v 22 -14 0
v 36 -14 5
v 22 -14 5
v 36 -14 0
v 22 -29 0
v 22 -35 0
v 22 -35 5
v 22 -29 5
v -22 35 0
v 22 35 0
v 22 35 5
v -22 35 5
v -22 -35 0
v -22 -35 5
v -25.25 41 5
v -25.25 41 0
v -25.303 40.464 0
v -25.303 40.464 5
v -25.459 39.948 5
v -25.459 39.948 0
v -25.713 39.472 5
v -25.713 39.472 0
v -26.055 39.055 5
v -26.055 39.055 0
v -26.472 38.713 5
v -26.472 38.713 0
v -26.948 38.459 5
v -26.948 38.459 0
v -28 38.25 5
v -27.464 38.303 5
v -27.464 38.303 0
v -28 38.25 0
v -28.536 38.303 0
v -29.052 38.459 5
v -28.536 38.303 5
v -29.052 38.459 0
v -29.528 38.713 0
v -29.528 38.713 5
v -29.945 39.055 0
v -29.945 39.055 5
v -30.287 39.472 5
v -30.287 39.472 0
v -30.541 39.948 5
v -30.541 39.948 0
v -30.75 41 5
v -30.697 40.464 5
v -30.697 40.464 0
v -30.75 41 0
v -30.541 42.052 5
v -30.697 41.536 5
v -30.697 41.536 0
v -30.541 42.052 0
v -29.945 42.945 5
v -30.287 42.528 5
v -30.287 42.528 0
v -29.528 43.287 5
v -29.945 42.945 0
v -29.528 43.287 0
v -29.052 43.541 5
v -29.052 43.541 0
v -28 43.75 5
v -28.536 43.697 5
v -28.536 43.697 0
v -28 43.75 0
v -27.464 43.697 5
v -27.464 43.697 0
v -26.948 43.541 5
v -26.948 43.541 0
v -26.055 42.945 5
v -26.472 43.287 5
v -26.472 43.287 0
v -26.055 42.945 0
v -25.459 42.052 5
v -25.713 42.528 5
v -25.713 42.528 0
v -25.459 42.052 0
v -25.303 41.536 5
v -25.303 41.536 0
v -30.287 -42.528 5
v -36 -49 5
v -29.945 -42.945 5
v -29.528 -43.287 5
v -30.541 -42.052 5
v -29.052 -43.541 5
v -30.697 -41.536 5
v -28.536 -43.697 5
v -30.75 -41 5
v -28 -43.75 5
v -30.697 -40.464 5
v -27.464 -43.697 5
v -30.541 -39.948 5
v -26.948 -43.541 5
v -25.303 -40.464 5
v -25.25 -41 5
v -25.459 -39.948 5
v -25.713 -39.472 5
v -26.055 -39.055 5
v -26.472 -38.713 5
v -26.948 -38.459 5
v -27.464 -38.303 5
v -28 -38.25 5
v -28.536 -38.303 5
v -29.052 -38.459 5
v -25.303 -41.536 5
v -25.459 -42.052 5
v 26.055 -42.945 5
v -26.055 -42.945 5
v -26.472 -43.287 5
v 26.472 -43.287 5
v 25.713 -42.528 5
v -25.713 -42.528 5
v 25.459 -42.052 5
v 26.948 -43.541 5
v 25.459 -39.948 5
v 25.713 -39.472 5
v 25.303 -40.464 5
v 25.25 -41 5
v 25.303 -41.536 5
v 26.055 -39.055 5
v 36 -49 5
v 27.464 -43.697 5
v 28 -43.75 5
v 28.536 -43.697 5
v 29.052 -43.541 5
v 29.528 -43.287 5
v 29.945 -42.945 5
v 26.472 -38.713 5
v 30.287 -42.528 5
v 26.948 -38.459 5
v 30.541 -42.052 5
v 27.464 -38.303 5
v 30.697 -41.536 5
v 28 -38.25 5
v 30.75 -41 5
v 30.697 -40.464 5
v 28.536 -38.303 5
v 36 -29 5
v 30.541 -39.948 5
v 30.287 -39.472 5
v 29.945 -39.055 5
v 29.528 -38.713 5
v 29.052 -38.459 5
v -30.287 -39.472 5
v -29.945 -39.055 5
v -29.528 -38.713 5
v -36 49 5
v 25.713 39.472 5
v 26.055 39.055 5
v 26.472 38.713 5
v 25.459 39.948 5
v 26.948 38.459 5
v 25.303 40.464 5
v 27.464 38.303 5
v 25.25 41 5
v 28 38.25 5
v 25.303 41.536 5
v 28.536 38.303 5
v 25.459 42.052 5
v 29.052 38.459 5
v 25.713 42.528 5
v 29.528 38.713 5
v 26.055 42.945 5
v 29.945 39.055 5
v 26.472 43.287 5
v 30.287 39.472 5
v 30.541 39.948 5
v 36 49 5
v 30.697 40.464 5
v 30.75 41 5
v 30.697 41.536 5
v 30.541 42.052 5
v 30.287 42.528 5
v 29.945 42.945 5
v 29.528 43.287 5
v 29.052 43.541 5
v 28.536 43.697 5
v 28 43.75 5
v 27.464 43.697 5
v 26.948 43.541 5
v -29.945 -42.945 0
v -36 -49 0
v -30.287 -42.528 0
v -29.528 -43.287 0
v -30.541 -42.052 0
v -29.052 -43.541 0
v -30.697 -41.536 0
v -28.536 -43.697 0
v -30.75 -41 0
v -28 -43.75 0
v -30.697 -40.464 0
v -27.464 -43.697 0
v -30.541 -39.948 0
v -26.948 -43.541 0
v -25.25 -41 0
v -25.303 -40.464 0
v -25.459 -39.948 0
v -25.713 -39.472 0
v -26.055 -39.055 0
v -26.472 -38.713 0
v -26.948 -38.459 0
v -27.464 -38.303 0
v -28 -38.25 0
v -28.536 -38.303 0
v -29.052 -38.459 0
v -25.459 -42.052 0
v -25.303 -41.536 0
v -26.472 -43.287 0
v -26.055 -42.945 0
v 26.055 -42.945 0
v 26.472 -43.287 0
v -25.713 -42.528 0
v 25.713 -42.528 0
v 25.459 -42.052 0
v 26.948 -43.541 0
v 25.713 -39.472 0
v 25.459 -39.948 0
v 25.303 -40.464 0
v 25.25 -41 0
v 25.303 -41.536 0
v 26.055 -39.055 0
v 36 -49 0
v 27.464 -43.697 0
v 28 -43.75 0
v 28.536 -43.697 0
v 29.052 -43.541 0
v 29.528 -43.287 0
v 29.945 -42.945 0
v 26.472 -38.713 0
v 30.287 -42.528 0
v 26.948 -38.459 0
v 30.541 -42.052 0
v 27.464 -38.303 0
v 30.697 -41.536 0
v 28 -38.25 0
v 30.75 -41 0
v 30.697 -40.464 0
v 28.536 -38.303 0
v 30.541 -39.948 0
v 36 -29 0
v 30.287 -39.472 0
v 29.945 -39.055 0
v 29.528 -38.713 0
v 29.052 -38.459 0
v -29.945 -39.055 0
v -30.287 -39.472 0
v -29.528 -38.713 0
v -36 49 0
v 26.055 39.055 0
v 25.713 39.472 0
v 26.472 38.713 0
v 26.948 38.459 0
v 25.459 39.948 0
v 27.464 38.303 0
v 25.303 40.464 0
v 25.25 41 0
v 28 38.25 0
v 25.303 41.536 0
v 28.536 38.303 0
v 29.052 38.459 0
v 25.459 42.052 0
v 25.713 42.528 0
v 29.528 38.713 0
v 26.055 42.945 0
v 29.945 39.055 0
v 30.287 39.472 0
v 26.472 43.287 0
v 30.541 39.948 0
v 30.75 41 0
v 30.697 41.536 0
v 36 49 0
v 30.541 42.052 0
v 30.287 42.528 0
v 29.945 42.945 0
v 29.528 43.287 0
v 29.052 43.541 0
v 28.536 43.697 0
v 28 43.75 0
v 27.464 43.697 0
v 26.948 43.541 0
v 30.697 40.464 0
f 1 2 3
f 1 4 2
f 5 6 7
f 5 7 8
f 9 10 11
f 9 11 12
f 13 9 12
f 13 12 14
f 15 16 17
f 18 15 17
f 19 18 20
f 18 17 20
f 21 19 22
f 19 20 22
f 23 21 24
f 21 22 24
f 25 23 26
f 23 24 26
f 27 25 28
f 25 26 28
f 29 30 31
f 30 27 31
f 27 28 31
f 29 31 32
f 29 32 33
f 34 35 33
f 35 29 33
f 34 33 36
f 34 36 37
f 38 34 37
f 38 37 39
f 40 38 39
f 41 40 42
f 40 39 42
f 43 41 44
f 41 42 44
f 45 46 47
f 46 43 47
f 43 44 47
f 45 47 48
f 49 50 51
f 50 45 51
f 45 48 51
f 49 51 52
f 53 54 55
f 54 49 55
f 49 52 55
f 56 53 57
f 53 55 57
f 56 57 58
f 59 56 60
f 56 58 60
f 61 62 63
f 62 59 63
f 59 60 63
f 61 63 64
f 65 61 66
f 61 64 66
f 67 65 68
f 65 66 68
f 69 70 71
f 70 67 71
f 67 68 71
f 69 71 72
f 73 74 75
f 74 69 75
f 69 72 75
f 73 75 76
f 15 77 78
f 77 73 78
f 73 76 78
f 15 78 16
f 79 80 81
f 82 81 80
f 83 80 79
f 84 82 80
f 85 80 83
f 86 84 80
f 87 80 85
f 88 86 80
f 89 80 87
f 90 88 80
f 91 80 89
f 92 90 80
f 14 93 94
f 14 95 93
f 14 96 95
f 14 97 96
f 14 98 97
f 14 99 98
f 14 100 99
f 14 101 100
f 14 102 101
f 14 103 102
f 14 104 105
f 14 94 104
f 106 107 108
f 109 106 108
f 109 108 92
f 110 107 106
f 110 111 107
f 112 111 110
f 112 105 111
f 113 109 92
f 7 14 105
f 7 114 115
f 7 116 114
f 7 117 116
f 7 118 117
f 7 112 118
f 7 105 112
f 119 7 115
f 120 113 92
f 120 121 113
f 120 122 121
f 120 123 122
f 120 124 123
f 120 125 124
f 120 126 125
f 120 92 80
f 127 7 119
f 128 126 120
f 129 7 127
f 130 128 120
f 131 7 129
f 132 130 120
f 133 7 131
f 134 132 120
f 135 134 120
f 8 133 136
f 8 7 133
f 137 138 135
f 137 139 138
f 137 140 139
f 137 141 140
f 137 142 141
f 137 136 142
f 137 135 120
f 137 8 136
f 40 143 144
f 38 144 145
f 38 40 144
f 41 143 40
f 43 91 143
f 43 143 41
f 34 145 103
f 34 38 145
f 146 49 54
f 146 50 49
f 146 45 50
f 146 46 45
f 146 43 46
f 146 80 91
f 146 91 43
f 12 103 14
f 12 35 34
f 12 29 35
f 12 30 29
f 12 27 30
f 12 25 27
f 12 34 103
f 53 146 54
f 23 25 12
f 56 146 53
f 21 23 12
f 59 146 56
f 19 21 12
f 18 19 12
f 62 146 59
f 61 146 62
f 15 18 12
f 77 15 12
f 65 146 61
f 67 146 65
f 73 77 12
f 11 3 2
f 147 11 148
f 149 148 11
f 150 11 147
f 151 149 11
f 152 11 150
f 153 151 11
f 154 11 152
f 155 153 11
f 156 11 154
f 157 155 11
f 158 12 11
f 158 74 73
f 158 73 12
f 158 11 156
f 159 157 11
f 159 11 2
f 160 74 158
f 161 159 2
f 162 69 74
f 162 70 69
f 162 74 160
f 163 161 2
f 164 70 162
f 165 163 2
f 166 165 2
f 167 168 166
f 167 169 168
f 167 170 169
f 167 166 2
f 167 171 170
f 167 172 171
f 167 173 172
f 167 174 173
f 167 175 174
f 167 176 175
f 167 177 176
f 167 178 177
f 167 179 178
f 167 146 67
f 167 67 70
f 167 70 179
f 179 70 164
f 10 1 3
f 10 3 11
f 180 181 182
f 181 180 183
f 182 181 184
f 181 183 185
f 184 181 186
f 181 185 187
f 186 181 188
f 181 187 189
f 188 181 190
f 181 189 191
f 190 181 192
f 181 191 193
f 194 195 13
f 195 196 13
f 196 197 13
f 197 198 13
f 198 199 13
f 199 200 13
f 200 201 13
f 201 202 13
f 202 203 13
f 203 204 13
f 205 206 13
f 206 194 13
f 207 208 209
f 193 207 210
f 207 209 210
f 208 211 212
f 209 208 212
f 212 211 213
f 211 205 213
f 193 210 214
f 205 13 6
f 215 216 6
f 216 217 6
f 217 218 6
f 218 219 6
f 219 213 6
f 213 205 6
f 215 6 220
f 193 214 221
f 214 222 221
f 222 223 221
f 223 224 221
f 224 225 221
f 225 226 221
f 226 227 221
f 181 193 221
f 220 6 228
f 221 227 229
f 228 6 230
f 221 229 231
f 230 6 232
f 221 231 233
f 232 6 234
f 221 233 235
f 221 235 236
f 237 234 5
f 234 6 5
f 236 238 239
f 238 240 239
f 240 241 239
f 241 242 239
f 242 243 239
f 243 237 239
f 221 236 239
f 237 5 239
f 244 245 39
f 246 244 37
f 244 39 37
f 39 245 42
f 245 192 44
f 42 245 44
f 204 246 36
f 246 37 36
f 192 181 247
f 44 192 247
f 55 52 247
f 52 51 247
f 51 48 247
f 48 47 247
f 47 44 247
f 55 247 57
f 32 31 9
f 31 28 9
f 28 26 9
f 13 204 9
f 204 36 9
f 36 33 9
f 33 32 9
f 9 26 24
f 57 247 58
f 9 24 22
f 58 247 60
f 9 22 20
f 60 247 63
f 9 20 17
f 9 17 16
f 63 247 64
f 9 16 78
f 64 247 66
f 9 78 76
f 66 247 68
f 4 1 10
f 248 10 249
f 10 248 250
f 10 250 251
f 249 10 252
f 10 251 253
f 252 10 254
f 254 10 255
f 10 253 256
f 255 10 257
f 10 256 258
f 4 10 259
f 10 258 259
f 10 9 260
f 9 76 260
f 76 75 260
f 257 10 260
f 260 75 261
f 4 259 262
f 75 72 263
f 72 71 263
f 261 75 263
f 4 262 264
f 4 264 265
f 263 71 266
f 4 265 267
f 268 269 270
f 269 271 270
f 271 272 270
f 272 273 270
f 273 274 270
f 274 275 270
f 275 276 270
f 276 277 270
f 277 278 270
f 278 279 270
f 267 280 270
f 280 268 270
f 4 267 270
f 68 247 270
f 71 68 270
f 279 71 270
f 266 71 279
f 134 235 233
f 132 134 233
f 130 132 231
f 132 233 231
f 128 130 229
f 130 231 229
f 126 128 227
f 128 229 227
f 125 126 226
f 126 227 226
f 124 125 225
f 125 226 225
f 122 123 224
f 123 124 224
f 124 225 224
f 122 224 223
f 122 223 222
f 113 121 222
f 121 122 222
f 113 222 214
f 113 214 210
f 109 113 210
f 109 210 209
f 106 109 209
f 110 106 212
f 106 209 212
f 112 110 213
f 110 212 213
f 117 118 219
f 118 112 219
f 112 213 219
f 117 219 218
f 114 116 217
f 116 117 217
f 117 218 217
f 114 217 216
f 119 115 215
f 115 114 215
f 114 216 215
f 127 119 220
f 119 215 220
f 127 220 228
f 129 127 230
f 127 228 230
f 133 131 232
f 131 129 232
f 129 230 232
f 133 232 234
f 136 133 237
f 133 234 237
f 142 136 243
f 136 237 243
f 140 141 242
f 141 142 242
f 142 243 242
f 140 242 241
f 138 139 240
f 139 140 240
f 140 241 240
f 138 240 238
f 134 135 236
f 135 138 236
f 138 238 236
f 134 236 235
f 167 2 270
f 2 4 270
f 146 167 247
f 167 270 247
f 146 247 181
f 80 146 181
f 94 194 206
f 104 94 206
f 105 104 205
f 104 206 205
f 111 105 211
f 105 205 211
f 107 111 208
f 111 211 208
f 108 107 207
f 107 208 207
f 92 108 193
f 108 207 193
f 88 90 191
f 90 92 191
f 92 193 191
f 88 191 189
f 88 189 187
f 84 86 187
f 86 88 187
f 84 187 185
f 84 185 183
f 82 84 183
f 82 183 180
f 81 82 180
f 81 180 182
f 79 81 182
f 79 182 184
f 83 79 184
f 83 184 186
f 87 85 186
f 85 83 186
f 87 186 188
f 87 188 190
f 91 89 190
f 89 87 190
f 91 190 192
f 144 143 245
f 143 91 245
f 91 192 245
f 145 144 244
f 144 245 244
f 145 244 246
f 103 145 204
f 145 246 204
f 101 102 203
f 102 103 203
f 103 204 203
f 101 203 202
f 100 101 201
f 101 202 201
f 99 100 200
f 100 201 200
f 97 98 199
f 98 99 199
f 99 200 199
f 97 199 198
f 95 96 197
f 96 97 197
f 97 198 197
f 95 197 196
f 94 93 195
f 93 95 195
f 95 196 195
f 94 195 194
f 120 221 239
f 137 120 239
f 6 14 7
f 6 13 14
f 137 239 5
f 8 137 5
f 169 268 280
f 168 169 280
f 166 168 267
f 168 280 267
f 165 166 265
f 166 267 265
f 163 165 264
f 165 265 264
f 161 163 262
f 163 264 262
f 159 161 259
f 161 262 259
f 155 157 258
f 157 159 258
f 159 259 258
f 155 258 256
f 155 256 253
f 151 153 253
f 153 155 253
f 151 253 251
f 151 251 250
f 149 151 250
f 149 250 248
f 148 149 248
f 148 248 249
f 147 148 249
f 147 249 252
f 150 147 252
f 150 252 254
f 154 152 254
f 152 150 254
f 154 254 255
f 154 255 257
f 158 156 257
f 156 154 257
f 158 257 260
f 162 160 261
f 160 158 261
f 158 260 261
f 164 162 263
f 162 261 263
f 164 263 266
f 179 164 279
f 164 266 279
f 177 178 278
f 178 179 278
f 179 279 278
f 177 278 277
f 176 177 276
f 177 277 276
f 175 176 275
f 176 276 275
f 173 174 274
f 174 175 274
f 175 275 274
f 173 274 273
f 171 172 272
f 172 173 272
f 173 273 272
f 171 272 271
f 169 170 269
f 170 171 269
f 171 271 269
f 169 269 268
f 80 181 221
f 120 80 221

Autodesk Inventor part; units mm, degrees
ref_plane "YZ Plane" through (0, 0, 0) normal (1, 0, 0) x (0, 1, 0)
ref_plane "XZ Plane" through (0, 0, 0) normal (0, 1, 0) x (-1, 0, 0)
ref_plane "XY Plane" through (0, 0, 0) normal (0, 0, 1) x (1, 0, 0)
ref_plane "Plano de trabajo1" through (0, 0, 0) normal (0, 0, 1) x (1, 0, 0)
sketch "Boceto1" plane through (0, 0, 0) normal (0, 0, 1) x (1, 0, 0)
  line L0 (-22, -35) -> (22, -35) projected
  line L1 (-22, 35) -> (-22, -35) projected
  line L2 (22, 35) -> (-22, 35) projected
  line L3 (22, -35) -> (22, 35) projected
  line L4 (-36, -49) -> (36, -49) projected
  line L5 (36, -49) -> (36, 49) projected
  line L6 (36, 49) -> (-36, 49) projected
  line L7 (-36, 49) -> (-36, -49) projected
  line L8 (-36, -49) -> (36, -49)
  line L9 (36, -49) -> (36, 49)
  line L10 (36, 49) -> (-36, 49)
  line L11 (-36, 49) -> (-36, -49)
  line L12 (-22, -35) -> (22, -35)
  line L13 (22, 35) -> (-22, 35)
  line L14 (-22, 35) -> (-22, -35)
  circle A0 centre (28, -41) radius 2.75 projected
  circle A1 centre (-28, 41) radius 2.75 projected
  circle A2 centre (28, 41) radius 2.75 projected
  circle A3 centre (-28, -41) radius 2.75 projected
  line L15 (36, -49) -> (36, -29)
  line L16 (36, -29) -> (22, -29)
  line L17 (36, -29) -> (36, -14)
  line L18 (36, -14) -> (22, -14)
  line L19 (22, -35) -> (22, -29)
  line L20 (22, -14) -> (22, 35)
  point P0 (0, 0)
  dimension "d16" = 20
  dimension "d17" = 15
  dimension "d18" = 0
ref_plane "Plano de trabajo4" through (0, 0, 5) normal (0, 0, 1) x (1, 0, 0)
ref_plane "Plano de trabajo3" through (0, 0, 5) normal (0, 0, 1) x (1, 0, 0)
ref_plane "Plano de trabajo2" through (0, 0, 5) normal (0, 0, 1) x (1, 0, 0)
sketch "Boceto4" plane through (0, 0, 5) normal (0, 0, 1) x (1, 0, 0)
  point P0 (0, 0)
extrude "Extrusión2" add sketch "Boceto1" along normal blind 5 contours L0 L3 L16 L5 L4 L7 L6 L18 L2 L1
sketch "Boceto2" plane through (0, 0, 5) normal (0, 0, 1) x (1, 0, 0)
  point P0 (-28, 41)
  point P1 (28, 41)
  point P2 (28, -41)
  point P3 (-28, -41)
sketch "Boceto3" plane through (0, 0, 5) normal (0, 0, 1) x (1, 0, 0)
  point P0 (-28, 41)
  point P1 (28, 41)
  point P2 (28, -41)
  point P3 (-28, -41)
